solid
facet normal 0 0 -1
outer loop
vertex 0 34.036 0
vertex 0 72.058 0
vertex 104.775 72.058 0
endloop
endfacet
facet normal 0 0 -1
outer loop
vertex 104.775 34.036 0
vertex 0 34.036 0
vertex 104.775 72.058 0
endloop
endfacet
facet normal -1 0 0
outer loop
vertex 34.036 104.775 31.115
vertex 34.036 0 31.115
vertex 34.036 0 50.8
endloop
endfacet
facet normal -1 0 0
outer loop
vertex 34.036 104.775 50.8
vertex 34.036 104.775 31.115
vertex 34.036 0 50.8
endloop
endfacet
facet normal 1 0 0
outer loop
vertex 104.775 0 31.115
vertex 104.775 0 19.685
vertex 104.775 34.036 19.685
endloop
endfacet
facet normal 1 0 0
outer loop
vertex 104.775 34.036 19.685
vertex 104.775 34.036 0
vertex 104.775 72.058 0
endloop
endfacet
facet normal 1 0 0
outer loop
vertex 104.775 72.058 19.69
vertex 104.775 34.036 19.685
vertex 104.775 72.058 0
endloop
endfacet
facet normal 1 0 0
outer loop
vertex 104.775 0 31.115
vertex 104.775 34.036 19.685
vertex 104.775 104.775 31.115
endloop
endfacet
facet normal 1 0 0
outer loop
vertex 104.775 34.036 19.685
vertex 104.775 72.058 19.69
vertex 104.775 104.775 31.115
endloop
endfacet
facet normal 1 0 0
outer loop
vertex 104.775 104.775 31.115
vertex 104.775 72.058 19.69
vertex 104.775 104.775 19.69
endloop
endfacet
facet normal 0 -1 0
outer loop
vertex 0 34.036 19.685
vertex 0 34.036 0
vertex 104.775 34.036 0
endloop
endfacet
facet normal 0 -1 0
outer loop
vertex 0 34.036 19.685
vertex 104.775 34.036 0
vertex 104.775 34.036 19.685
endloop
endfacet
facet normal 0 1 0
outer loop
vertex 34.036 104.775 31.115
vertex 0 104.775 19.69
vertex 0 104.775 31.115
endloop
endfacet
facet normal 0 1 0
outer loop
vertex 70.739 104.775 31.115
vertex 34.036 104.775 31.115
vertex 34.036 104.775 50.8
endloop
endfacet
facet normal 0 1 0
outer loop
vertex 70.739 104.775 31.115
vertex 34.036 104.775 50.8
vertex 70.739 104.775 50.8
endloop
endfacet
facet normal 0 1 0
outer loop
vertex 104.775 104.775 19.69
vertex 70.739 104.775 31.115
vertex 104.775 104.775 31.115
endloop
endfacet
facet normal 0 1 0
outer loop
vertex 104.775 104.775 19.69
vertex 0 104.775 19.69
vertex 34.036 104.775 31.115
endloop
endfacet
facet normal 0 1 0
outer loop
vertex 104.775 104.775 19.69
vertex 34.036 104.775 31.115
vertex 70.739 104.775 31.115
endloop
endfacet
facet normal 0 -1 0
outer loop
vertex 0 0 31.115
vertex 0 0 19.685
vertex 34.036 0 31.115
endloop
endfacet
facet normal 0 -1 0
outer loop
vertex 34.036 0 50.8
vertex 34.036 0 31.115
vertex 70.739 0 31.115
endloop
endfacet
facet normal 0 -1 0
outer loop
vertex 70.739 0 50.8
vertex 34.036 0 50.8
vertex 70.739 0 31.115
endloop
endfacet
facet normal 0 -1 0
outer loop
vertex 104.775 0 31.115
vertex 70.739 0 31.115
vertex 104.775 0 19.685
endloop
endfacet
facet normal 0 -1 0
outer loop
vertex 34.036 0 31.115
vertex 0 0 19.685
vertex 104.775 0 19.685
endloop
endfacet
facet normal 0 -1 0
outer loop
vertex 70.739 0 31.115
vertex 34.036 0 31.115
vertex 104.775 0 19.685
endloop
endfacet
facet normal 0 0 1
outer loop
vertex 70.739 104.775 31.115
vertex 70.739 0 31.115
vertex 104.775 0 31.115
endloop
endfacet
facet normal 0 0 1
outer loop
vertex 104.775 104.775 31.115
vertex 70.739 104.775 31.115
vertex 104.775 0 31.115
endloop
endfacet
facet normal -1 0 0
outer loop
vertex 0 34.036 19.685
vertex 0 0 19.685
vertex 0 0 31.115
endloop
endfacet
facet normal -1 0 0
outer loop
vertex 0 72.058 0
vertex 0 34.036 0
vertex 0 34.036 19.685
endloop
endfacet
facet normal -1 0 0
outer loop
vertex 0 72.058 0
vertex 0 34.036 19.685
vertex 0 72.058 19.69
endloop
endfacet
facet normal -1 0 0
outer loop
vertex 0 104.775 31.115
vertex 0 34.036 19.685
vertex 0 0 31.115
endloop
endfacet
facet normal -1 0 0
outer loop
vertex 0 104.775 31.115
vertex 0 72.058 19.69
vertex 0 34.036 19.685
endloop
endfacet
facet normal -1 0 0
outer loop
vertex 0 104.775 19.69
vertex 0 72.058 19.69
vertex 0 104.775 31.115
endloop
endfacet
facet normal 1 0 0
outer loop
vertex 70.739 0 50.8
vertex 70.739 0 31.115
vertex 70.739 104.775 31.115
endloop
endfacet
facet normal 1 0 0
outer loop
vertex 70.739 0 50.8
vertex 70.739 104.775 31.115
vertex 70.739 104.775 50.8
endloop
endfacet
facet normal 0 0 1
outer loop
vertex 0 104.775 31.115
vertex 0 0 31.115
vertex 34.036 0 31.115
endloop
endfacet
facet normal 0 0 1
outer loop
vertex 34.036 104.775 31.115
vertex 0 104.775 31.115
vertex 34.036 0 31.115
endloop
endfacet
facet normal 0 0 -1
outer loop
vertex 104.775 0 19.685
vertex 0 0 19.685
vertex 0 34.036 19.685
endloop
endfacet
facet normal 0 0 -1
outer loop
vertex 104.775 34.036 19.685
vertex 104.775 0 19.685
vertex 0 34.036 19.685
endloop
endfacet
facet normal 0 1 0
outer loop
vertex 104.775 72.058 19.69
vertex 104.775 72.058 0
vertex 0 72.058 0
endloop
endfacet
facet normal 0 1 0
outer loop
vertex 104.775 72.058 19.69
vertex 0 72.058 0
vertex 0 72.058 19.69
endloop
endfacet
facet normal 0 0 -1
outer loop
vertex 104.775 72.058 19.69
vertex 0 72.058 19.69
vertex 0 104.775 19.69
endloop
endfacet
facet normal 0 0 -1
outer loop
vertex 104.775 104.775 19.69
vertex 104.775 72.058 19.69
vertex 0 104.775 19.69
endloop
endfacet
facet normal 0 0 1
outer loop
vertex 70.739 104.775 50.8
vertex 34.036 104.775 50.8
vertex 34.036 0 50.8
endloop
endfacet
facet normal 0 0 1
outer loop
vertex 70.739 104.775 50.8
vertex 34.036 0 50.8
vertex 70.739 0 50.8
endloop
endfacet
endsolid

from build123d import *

# Parameters (mm, degrees)
F0_W     = 104.775
F0_H     = 104.775
F1_DEPTH = 50.8
F2_W     = 34.036
F2_H     = 19.685
F3_DEPTH = 104.775
F4_W     = 34.036
F4_H     = 19.6899231523
F4_H_2   = 19.685
F5_DEPTH = 158.242


with BuildPart() as f1:
    # F0 (on Top) → F1 (new body)
    with BuildSketch(Plane.XY):
        with Locations((52.3875, 52.3875)):
            Rectangle(F0_W, F0_H)
    extrude(amount=F1_DEPTH)

    # F2 (on face) → F3 (cut)
    with BuildSketch(Plane.XZ):
        with Locations((87.757, 40.9575)):
            Rectangle(F2_W, F2_H)
        with Locations((17.018, 40.9575)):
            Rectangle(F2_W, F2_H)
    extrude(amount=-F3_DEPTH, mode=Mode.SUBTRACT)

    # F4 (on Right) → F5 (cut)
    with BuildSketch(Plane.YZ):
        with Locations((89.075582438, 9.8449615762)):
            Rectangle(F4_W, F4_H)
        with Locations((17.018, 9.8425)):
            Rectangle(F4_W, F4_H_2)
    extrude(amount=F5_DEPTH, mode=Mode.SUBTRACT)


solid = f1.part
